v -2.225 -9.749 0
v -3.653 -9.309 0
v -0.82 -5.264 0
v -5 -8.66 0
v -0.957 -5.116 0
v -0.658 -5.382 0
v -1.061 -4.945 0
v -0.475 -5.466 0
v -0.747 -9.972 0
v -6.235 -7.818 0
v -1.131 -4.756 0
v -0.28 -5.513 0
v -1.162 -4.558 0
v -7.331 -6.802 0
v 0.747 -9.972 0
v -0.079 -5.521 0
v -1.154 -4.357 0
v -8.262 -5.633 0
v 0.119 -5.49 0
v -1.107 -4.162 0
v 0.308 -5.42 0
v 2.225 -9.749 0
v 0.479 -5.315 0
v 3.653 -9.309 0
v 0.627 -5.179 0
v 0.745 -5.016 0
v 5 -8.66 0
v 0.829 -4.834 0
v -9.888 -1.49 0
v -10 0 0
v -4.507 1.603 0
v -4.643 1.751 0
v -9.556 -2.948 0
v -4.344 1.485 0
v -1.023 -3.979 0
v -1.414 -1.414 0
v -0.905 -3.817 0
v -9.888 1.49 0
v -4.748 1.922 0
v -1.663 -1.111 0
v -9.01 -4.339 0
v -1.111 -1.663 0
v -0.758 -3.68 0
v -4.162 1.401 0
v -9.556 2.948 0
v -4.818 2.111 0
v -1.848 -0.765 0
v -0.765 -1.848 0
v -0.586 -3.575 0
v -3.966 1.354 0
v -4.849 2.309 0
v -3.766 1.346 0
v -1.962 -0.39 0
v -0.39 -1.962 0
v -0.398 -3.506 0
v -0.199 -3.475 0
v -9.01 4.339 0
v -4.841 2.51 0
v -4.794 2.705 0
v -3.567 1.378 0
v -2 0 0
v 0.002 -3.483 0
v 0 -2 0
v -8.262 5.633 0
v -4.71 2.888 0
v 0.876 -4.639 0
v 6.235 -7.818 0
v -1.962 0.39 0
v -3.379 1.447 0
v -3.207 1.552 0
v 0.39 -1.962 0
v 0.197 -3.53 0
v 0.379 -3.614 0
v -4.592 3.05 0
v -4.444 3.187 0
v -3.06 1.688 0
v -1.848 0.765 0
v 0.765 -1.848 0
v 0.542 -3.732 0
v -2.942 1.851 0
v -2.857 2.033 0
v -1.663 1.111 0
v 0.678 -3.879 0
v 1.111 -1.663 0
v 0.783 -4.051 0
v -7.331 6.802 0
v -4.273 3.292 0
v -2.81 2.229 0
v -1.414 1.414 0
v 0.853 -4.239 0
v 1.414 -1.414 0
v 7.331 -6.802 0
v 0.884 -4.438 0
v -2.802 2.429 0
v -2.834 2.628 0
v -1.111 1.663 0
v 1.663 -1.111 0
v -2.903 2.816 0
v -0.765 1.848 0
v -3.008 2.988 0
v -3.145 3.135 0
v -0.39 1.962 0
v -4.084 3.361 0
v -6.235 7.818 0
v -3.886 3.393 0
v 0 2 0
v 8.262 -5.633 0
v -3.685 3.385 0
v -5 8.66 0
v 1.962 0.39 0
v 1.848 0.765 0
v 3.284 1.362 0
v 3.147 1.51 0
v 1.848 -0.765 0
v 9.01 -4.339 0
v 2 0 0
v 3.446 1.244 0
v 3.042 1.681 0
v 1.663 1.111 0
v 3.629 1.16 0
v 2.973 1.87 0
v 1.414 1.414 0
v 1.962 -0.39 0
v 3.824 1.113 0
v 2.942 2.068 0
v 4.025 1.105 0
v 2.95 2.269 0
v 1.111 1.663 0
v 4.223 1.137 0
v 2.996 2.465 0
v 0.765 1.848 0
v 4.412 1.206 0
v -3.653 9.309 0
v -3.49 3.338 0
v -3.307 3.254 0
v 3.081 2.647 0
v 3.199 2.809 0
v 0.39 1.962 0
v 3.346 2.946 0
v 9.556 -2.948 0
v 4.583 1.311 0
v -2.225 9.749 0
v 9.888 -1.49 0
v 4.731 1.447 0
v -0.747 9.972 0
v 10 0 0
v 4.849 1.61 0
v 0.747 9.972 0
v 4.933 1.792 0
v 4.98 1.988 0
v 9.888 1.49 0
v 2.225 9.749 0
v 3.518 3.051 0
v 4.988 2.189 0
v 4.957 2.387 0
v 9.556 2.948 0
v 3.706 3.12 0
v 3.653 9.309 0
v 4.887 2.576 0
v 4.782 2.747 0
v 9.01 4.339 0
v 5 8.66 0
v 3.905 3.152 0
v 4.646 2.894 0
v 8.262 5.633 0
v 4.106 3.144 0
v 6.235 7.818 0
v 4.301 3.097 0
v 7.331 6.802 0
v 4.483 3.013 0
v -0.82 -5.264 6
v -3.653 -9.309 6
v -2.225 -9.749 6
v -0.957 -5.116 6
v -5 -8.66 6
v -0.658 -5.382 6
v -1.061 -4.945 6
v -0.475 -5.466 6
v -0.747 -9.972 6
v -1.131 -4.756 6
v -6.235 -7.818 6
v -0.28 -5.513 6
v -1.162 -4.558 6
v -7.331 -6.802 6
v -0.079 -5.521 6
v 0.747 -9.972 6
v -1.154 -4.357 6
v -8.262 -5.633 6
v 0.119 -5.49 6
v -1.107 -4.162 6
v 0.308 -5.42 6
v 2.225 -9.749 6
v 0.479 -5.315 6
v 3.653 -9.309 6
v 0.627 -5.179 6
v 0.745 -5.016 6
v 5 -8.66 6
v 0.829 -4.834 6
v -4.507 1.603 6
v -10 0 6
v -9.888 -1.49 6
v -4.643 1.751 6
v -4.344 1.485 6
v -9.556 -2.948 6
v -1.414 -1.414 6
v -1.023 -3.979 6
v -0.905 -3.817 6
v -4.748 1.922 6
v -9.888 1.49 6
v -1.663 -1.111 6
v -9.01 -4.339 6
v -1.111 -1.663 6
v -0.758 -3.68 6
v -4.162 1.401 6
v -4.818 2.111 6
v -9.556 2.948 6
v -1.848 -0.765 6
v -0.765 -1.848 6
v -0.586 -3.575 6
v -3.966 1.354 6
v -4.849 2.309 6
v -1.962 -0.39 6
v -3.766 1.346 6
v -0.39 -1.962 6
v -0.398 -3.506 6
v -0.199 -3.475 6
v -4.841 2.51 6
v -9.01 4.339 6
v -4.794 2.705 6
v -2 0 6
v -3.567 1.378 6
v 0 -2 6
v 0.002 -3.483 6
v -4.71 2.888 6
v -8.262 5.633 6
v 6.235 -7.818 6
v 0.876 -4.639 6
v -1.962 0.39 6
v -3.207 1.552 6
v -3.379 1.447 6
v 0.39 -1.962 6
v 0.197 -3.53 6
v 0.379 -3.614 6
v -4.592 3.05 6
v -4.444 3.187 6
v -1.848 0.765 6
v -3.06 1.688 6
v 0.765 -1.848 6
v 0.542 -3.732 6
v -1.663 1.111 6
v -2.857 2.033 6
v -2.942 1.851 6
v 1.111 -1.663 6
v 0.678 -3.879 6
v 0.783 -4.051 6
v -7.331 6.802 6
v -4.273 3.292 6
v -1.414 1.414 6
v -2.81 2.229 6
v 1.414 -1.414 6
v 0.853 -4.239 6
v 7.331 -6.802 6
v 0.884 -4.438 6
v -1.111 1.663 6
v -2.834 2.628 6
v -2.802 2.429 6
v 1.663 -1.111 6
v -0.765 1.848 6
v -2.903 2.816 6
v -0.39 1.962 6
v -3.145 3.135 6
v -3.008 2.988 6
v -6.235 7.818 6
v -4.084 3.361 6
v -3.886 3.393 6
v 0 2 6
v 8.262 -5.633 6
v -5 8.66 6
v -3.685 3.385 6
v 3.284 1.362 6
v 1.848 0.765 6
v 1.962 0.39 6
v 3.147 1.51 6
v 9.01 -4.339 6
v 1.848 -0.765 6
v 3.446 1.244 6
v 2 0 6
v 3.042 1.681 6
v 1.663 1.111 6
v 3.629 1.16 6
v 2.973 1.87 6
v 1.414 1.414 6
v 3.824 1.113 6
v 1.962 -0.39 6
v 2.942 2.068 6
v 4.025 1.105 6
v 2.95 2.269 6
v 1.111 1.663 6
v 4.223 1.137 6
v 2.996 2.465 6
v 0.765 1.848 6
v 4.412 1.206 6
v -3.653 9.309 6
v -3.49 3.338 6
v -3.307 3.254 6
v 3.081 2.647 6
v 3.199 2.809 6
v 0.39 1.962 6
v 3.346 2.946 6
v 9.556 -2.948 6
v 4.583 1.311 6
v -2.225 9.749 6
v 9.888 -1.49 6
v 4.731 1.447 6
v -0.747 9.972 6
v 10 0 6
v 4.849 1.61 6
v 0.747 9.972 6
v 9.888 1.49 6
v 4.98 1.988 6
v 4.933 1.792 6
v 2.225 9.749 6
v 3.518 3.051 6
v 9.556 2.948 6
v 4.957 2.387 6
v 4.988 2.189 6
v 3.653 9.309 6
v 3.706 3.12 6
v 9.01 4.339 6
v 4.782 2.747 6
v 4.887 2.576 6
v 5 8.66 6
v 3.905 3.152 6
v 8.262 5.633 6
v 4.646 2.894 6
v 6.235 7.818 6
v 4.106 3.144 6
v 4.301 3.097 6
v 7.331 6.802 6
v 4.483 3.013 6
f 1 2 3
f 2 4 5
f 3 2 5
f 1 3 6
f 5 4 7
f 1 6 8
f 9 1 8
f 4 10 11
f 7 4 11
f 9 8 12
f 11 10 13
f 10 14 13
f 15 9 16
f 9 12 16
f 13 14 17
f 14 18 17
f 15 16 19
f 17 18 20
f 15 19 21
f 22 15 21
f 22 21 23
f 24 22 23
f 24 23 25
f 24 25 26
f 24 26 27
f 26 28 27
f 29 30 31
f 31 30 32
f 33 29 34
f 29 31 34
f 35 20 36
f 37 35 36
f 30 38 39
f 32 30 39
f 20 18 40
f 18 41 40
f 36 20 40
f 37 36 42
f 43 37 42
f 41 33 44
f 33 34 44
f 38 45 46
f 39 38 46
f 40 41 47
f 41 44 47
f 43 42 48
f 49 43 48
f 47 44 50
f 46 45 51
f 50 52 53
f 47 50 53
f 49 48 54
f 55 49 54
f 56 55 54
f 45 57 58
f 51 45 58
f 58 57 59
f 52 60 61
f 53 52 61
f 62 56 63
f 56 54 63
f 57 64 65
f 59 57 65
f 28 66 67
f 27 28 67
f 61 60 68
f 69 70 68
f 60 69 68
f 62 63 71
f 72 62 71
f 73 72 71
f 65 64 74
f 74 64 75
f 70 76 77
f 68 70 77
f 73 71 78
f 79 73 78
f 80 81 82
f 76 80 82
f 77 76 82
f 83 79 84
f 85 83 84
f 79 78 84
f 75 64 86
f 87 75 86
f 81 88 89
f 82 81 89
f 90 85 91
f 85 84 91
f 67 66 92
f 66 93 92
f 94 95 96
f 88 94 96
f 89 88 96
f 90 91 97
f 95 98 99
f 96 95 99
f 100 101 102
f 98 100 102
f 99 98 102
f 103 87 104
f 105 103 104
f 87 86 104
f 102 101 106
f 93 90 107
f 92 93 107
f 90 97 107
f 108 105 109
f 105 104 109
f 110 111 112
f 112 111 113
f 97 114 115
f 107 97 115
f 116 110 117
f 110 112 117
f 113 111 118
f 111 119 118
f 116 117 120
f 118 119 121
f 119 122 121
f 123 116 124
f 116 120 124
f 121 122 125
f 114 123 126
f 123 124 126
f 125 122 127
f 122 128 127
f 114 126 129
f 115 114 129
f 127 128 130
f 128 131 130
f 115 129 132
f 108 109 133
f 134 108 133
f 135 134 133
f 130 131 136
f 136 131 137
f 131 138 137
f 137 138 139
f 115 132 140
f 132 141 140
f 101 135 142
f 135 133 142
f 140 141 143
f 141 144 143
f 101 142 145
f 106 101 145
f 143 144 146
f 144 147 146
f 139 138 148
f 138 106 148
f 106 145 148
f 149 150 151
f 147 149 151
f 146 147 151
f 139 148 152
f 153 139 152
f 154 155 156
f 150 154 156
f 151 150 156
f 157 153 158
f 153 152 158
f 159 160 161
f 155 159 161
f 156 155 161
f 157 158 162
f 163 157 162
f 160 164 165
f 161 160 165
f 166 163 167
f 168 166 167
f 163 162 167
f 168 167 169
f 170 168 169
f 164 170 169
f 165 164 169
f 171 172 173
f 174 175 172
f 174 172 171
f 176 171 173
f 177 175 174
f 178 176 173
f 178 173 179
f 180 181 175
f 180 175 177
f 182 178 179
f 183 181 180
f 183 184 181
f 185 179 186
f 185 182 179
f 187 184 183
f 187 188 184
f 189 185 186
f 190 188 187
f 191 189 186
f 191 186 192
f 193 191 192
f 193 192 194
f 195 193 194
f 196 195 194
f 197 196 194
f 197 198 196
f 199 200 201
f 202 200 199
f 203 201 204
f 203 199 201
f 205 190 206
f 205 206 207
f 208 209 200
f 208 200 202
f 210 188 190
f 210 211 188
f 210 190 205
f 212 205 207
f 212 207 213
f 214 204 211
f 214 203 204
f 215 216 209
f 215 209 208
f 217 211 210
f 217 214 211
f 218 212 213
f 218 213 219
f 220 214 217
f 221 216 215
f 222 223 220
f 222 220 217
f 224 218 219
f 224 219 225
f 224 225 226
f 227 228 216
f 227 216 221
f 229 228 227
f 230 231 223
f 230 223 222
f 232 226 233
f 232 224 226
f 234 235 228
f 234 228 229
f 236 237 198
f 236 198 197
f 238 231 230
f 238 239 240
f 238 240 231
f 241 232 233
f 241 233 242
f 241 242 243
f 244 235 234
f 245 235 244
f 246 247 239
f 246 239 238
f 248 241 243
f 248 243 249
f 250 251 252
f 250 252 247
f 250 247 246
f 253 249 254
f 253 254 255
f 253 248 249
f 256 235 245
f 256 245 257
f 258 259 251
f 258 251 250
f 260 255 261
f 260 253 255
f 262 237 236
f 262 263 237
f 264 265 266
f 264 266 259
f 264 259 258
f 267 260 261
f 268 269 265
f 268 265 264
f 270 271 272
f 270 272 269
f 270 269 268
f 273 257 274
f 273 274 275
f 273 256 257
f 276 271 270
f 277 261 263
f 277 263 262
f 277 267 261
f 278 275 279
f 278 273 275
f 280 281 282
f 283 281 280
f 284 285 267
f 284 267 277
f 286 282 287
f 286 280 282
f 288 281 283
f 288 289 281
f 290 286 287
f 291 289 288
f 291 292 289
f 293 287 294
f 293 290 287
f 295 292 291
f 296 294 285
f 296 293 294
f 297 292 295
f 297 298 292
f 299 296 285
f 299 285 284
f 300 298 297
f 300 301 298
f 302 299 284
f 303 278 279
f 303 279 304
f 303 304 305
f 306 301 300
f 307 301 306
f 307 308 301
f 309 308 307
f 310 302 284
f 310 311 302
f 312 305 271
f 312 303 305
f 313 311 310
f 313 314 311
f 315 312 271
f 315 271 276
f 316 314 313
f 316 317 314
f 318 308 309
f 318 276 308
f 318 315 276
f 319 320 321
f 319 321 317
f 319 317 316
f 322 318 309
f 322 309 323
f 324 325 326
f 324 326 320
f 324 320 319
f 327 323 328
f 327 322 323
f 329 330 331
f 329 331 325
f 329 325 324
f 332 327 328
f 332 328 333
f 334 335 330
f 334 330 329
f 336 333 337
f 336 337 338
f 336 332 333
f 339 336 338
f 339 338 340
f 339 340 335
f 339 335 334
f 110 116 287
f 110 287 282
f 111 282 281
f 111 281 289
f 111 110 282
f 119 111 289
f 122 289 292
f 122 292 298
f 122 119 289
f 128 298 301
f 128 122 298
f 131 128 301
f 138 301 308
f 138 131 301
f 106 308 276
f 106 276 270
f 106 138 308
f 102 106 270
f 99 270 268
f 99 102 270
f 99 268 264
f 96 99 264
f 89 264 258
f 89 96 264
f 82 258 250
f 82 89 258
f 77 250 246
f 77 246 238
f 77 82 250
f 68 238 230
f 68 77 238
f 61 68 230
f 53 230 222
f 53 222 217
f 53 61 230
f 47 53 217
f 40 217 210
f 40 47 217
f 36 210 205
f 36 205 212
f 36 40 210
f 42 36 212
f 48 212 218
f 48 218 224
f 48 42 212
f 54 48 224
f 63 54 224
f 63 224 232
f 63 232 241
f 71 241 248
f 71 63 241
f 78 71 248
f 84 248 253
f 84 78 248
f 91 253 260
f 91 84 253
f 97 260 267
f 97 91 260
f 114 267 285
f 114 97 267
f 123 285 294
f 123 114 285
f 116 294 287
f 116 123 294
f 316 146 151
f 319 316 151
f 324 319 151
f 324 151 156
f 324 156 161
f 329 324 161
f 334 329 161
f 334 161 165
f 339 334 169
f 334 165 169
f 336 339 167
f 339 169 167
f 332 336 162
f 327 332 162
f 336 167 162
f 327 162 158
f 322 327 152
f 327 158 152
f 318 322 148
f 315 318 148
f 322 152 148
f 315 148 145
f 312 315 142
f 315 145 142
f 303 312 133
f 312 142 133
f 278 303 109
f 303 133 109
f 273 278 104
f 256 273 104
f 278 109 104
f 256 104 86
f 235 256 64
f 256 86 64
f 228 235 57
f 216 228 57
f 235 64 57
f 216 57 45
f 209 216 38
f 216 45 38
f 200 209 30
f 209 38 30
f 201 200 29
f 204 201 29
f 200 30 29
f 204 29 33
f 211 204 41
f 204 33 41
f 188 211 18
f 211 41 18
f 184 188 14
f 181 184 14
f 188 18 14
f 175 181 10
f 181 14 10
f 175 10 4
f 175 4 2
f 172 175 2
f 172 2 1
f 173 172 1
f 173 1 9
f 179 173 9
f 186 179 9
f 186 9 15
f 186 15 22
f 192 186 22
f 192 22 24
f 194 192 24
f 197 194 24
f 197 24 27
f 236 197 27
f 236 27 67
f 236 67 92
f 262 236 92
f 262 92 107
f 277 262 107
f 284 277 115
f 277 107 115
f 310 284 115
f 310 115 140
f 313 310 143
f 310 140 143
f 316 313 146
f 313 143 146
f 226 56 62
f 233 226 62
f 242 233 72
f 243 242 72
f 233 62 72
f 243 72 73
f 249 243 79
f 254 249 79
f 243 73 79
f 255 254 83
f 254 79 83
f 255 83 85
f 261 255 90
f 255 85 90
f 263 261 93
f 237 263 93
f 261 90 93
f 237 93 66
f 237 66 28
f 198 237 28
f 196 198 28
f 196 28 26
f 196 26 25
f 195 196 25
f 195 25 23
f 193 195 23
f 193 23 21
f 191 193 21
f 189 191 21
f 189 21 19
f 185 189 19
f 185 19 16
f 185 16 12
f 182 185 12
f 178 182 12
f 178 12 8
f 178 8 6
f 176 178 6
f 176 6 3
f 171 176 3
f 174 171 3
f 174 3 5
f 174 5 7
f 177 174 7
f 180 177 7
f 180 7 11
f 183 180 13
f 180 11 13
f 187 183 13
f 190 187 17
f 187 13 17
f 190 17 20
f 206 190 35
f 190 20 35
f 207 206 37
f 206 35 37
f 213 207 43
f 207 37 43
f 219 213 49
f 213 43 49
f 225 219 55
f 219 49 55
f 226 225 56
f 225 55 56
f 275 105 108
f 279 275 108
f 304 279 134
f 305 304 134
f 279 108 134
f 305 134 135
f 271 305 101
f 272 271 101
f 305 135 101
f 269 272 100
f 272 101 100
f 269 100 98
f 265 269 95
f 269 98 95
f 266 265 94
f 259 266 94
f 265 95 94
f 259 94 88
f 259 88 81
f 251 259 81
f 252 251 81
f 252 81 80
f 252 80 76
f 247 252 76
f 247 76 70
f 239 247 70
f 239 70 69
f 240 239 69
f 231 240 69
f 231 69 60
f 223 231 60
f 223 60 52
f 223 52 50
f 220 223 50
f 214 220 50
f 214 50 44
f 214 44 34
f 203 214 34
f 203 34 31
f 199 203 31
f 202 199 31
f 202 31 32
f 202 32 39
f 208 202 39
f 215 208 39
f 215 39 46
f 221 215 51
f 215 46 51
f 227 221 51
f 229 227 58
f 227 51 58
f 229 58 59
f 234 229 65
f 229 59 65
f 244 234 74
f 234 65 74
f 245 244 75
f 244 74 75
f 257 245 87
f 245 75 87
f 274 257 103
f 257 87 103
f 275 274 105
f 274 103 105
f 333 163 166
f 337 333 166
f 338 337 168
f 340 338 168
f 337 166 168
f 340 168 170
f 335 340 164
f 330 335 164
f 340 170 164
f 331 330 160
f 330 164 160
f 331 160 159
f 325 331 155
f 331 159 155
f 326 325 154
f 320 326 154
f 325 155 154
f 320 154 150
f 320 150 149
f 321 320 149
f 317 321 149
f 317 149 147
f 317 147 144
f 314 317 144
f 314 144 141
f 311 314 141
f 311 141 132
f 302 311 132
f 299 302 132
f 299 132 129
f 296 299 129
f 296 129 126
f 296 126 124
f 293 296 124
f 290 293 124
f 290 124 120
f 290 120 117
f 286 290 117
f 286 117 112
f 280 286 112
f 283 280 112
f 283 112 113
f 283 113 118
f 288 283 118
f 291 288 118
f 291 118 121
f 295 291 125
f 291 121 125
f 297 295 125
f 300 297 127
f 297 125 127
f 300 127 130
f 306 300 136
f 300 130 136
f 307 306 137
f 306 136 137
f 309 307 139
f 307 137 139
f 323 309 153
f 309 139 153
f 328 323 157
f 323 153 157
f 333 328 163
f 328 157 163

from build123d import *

# Parameters (mm, degrees)
SKETCH1_R                    = 10
SKETCH1_R_2                  = 2
BOSS_EXTRUDE1_DEPTH          = 6
F_2_05_2_05_DIAMETER_HOLE1_D = 2.05


with BuildPart() as part:
    # Sketch1 → Boss-Extrude1 (new body)
    with BuildSketch(Plane.XY):
        Circle(SKETCH1_R)
        Circle(SKETCH1_R_2, mode=Mode.SUBTRACT)
    extrude(amount=BOSS_EXTRUDE1_DEPTH)

    # Ø2.05 (2.05) Diameter Hole1 (through all)
    with Locations(Plane(origin=(-167.340510867, 18.18779669, 6.7366), x_dir=(0.05861513275015712, -0.9982806550327825, 0), z_dir=(0, 0, 1))):
        with Locations((32.447172363, 165.584185204), (25.375630841, 162.306487764), (26.072832352, 170.069471085)):
            Hole(F_2_05_2_05_DIAMETER_HOLE1_D / 2)


solid = part.part
